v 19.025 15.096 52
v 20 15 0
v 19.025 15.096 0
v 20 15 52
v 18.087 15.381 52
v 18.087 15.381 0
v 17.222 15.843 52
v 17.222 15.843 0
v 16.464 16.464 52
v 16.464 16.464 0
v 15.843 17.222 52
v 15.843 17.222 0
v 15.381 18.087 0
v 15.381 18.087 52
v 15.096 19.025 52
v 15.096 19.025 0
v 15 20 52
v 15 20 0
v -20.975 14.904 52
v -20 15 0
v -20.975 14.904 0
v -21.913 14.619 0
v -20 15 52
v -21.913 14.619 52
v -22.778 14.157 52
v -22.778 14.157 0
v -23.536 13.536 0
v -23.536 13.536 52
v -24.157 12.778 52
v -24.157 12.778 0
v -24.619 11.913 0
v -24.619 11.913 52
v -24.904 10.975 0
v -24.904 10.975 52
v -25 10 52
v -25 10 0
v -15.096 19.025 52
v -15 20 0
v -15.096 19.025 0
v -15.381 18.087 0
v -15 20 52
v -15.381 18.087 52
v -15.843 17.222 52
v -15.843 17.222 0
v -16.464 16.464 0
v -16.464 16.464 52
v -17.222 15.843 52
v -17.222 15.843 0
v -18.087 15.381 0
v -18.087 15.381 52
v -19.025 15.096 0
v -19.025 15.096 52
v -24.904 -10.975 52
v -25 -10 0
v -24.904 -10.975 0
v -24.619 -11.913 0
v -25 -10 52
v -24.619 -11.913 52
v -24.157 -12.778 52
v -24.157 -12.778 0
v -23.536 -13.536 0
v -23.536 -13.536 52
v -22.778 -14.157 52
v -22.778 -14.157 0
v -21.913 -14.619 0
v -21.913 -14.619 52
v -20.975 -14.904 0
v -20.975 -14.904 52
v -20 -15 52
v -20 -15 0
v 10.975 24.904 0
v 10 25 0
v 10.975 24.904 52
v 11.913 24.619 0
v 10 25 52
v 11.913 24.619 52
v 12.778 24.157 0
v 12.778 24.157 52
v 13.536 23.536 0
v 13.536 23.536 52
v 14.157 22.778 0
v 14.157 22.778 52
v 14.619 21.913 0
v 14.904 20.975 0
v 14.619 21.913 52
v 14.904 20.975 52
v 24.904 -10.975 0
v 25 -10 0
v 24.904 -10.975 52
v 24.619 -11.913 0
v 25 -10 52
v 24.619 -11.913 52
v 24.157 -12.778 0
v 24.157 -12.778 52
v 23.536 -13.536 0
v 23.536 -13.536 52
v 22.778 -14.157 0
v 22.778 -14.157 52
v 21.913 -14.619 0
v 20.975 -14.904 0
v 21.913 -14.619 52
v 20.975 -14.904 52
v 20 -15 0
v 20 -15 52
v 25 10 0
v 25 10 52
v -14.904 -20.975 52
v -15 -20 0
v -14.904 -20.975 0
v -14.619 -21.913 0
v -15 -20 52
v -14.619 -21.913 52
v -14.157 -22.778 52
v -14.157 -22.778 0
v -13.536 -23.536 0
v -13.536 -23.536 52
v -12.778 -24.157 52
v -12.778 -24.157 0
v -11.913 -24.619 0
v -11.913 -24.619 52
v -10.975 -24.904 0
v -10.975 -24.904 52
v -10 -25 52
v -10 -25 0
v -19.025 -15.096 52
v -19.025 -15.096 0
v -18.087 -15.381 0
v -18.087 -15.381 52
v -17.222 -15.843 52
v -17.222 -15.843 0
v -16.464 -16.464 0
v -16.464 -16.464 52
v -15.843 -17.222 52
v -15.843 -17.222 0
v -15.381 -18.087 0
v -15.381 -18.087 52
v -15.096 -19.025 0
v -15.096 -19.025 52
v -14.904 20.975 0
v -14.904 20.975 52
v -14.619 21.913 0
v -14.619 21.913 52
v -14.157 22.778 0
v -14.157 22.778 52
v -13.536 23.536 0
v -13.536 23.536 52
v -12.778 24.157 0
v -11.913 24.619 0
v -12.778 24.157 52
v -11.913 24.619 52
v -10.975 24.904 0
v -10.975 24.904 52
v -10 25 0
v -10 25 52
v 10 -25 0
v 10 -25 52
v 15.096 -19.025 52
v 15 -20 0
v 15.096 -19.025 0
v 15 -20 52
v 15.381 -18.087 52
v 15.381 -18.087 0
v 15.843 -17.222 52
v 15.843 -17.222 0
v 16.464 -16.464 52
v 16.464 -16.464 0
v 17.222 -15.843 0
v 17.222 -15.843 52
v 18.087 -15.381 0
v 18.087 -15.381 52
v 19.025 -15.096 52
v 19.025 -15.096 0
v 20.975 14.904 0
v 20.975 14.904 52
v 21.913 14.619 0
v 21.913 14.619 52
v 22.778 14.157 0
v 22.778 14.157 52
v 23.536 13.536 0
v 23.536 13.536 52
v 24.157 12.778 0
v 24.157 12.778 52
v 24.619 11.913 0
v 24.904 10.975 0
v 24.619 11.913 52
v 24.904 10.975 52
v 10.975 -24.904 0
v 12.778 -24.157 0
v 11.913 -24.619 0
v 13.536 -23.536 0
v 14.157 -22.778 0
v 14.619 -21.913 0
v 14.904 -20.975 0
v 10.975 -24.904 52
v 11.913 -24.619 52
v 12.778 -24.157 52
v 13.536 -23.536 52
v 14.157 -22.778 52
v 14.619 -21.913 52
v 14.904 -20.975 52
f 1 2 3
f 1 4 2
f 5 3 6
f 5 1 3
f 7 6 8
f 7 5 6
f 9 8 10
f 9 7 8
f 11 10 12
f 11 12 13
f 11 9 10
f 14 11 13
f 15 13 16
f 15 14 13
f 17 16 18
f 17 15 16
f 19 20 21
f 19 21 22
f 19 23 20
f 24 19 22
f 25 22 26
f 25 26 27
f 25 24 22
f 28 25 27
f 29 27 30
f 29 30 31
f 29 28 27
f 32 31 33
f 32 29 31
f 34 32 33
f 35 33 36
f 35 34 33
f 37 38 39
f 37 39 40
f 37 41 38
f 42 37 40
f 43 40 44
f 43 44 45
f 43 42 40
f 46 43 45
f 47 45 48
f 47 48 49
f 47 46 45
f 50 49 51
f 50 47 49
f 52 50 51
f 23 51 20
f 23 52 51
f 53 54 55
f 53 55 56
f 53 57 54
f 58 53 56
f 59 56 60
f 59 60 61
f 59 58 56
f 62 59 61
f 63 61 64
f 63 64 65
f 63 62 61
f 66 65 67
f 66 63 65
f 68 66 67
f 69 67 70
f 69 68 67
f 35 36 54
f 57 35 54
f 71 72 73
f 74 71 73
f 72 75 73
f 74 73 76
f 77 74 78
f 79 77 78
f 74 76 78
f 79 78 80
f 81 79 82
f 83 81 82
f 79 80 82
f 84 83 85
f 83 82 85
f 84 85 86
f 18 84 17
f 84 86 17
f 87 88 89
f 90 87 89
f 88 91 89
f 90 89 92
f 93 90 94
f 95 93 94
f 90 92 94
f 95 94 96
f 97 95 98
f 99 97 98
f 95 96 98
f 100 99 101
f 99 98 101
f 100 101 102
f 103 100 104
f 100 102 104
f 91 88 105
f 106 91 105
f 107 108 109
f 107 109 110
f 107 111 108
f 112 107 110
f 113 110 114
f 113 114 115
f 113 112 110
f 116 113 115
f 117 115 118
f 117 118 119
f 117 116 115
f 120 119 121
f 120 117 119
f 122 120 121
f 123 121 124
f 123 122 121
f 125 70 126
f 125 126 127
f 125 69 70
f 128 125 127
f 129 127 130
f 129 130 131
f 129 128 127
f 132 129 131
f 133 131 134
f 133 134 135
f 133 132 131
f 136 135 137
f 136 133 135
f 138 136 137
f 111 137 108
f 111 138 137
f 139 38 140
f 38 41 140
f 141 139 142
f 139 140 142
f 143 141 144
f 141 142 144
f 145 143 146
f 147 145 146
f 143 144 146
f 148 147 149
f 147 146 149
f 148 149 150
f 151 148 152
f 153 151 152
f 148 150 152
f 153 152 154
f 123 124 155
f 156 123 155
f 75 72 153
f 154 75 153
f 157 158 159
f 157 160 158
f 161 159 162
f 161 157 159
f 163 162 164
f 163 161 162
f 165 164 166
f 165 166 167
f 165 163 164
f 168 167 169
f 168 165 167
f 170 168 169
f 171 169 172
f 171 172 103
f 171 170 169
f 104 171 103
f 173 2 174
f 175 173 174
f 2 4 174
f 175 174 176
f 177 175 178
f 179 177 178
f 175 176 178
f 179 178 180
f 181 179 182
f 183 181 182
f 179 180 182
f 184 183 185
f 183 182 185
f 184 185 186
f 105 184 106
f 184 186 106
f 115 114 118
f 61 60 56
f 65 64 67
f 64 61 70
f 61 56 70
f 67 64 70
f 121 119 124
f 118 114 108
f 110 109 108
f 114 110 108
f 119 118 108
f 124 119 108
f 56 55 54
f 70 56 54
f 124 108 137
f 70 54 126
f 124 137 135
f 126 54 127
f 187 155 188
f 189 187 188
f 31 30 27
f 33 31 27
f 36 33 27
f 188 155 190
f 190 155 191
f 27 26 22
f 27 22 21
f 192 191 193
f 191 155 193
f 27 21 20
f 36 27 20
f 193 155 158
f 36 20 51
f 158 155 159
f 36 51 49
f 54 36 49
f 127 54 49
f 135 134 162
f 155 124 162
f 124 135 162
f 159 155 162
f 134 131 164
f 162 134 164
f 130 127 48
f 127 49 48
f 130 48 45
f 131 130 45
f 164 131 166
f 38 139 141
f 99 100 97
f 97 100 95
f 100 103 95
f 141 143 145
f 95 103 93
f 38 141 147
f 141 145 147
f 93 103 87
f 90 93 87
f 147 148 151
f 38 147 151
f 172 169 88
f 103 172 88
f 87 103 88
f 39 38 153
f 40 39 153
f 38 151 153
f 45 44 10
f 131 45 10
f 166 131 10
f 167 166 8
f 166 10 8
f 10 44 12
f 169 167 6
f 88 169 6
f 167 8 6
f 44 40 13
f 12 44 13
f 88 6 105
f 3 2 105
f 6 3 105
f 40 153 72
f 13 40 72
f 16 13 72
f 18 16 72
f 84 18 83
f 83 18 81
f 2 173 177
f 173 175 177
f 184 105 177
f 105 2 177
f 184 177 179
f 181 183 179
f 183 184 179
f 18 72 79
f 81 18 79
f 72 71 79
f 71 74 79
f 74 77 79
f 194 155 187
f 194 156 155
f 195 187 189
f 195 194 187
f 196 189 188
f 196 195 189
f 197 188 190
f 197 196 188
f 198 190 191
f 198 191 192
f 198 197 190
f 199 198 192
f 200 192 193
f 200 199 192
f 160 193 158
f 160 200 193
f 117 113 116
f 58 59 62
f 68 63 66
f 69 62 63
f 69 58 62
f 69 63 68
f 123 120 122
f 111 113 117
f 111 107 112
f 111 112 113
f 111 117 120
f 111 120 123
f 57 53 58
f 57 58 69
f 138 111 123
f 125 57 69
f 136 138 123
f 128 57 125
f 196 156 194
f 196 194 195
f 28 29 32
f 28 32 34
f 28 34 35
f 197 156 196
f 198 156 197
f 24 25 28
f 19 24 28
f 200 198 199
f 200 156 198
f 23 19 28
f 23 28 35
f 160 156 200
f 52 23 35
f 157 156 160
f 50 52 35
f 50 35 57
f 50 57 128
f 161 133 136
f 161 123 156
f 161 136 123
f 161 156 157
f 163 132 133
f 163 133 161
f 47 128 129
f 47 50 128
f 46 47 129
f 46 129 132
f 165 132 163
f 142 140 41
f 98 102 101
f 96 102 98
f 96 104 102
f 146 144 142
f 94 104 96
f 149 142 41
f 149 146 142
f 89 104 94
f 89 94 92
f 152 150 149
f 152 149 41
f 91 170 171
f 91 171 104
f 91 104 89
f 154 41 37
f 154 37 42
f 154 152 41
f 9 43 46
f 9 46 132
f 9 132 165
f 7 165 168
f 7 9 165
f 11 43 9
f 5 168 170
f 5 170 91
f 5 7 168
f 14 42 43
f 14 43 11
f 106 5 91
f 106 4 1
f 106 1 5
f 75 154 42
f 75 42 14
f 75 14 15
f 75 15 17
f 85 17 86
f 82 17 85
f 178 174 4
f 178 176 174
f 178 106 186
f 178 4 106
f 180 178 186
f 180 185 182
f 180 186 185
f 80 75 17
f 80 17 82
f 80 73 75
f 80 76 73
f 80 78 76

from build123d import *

# Parameters (mm, degrees)
F1_DEPTH = 52
F2_R     = 5
F3_R     = 4.99999


# Not quite as in the source:
# - a fillet or chamfer is up to 0.001 mm smaller than in the source, because OpenCascade refuses the exact size


with BuildPart() as f1:
    # F0 (on Top) → F1 (new body)
    with BuildSketch(Plane.XY):
        Polygon((15, 25), (-15, 25), (-15, 15), (-25, 15), (-25, -15), (-15, -15), (-15, -25), (15, -25), (15, -15), (25, -15), (25, 15), (15, 15), align=None)
    extrude(amount=F1_DEPTH)

    # F2
    f2_edges = [f1.edges().sort_by_distance(p)[0] for p in [
        (-15, -15, 26),
        (15, -15, 26),
        (15, 15, 26),
        (-15, 15, 26),
    ]]
    fillet(f2_edges, radius=F2_R)

    # F3 (radius 5 in the source; OpenCascade refuses exactly that, so slightly less here)
    f3_edges = [f1.edges().sort_by_distance(p)[0] for p in [
        (25, 15, 26),
        (-15, 25, 26),
        (-25, 15, 26),
        (25, -15, 26),
        (15, -25, 26),
        (-15, -25, 26),
        (-25, -15, 26),
        (15, 25, 26),
    ]]
    fillet(f3_edges, radius=F3_R)


solid = f1.part
